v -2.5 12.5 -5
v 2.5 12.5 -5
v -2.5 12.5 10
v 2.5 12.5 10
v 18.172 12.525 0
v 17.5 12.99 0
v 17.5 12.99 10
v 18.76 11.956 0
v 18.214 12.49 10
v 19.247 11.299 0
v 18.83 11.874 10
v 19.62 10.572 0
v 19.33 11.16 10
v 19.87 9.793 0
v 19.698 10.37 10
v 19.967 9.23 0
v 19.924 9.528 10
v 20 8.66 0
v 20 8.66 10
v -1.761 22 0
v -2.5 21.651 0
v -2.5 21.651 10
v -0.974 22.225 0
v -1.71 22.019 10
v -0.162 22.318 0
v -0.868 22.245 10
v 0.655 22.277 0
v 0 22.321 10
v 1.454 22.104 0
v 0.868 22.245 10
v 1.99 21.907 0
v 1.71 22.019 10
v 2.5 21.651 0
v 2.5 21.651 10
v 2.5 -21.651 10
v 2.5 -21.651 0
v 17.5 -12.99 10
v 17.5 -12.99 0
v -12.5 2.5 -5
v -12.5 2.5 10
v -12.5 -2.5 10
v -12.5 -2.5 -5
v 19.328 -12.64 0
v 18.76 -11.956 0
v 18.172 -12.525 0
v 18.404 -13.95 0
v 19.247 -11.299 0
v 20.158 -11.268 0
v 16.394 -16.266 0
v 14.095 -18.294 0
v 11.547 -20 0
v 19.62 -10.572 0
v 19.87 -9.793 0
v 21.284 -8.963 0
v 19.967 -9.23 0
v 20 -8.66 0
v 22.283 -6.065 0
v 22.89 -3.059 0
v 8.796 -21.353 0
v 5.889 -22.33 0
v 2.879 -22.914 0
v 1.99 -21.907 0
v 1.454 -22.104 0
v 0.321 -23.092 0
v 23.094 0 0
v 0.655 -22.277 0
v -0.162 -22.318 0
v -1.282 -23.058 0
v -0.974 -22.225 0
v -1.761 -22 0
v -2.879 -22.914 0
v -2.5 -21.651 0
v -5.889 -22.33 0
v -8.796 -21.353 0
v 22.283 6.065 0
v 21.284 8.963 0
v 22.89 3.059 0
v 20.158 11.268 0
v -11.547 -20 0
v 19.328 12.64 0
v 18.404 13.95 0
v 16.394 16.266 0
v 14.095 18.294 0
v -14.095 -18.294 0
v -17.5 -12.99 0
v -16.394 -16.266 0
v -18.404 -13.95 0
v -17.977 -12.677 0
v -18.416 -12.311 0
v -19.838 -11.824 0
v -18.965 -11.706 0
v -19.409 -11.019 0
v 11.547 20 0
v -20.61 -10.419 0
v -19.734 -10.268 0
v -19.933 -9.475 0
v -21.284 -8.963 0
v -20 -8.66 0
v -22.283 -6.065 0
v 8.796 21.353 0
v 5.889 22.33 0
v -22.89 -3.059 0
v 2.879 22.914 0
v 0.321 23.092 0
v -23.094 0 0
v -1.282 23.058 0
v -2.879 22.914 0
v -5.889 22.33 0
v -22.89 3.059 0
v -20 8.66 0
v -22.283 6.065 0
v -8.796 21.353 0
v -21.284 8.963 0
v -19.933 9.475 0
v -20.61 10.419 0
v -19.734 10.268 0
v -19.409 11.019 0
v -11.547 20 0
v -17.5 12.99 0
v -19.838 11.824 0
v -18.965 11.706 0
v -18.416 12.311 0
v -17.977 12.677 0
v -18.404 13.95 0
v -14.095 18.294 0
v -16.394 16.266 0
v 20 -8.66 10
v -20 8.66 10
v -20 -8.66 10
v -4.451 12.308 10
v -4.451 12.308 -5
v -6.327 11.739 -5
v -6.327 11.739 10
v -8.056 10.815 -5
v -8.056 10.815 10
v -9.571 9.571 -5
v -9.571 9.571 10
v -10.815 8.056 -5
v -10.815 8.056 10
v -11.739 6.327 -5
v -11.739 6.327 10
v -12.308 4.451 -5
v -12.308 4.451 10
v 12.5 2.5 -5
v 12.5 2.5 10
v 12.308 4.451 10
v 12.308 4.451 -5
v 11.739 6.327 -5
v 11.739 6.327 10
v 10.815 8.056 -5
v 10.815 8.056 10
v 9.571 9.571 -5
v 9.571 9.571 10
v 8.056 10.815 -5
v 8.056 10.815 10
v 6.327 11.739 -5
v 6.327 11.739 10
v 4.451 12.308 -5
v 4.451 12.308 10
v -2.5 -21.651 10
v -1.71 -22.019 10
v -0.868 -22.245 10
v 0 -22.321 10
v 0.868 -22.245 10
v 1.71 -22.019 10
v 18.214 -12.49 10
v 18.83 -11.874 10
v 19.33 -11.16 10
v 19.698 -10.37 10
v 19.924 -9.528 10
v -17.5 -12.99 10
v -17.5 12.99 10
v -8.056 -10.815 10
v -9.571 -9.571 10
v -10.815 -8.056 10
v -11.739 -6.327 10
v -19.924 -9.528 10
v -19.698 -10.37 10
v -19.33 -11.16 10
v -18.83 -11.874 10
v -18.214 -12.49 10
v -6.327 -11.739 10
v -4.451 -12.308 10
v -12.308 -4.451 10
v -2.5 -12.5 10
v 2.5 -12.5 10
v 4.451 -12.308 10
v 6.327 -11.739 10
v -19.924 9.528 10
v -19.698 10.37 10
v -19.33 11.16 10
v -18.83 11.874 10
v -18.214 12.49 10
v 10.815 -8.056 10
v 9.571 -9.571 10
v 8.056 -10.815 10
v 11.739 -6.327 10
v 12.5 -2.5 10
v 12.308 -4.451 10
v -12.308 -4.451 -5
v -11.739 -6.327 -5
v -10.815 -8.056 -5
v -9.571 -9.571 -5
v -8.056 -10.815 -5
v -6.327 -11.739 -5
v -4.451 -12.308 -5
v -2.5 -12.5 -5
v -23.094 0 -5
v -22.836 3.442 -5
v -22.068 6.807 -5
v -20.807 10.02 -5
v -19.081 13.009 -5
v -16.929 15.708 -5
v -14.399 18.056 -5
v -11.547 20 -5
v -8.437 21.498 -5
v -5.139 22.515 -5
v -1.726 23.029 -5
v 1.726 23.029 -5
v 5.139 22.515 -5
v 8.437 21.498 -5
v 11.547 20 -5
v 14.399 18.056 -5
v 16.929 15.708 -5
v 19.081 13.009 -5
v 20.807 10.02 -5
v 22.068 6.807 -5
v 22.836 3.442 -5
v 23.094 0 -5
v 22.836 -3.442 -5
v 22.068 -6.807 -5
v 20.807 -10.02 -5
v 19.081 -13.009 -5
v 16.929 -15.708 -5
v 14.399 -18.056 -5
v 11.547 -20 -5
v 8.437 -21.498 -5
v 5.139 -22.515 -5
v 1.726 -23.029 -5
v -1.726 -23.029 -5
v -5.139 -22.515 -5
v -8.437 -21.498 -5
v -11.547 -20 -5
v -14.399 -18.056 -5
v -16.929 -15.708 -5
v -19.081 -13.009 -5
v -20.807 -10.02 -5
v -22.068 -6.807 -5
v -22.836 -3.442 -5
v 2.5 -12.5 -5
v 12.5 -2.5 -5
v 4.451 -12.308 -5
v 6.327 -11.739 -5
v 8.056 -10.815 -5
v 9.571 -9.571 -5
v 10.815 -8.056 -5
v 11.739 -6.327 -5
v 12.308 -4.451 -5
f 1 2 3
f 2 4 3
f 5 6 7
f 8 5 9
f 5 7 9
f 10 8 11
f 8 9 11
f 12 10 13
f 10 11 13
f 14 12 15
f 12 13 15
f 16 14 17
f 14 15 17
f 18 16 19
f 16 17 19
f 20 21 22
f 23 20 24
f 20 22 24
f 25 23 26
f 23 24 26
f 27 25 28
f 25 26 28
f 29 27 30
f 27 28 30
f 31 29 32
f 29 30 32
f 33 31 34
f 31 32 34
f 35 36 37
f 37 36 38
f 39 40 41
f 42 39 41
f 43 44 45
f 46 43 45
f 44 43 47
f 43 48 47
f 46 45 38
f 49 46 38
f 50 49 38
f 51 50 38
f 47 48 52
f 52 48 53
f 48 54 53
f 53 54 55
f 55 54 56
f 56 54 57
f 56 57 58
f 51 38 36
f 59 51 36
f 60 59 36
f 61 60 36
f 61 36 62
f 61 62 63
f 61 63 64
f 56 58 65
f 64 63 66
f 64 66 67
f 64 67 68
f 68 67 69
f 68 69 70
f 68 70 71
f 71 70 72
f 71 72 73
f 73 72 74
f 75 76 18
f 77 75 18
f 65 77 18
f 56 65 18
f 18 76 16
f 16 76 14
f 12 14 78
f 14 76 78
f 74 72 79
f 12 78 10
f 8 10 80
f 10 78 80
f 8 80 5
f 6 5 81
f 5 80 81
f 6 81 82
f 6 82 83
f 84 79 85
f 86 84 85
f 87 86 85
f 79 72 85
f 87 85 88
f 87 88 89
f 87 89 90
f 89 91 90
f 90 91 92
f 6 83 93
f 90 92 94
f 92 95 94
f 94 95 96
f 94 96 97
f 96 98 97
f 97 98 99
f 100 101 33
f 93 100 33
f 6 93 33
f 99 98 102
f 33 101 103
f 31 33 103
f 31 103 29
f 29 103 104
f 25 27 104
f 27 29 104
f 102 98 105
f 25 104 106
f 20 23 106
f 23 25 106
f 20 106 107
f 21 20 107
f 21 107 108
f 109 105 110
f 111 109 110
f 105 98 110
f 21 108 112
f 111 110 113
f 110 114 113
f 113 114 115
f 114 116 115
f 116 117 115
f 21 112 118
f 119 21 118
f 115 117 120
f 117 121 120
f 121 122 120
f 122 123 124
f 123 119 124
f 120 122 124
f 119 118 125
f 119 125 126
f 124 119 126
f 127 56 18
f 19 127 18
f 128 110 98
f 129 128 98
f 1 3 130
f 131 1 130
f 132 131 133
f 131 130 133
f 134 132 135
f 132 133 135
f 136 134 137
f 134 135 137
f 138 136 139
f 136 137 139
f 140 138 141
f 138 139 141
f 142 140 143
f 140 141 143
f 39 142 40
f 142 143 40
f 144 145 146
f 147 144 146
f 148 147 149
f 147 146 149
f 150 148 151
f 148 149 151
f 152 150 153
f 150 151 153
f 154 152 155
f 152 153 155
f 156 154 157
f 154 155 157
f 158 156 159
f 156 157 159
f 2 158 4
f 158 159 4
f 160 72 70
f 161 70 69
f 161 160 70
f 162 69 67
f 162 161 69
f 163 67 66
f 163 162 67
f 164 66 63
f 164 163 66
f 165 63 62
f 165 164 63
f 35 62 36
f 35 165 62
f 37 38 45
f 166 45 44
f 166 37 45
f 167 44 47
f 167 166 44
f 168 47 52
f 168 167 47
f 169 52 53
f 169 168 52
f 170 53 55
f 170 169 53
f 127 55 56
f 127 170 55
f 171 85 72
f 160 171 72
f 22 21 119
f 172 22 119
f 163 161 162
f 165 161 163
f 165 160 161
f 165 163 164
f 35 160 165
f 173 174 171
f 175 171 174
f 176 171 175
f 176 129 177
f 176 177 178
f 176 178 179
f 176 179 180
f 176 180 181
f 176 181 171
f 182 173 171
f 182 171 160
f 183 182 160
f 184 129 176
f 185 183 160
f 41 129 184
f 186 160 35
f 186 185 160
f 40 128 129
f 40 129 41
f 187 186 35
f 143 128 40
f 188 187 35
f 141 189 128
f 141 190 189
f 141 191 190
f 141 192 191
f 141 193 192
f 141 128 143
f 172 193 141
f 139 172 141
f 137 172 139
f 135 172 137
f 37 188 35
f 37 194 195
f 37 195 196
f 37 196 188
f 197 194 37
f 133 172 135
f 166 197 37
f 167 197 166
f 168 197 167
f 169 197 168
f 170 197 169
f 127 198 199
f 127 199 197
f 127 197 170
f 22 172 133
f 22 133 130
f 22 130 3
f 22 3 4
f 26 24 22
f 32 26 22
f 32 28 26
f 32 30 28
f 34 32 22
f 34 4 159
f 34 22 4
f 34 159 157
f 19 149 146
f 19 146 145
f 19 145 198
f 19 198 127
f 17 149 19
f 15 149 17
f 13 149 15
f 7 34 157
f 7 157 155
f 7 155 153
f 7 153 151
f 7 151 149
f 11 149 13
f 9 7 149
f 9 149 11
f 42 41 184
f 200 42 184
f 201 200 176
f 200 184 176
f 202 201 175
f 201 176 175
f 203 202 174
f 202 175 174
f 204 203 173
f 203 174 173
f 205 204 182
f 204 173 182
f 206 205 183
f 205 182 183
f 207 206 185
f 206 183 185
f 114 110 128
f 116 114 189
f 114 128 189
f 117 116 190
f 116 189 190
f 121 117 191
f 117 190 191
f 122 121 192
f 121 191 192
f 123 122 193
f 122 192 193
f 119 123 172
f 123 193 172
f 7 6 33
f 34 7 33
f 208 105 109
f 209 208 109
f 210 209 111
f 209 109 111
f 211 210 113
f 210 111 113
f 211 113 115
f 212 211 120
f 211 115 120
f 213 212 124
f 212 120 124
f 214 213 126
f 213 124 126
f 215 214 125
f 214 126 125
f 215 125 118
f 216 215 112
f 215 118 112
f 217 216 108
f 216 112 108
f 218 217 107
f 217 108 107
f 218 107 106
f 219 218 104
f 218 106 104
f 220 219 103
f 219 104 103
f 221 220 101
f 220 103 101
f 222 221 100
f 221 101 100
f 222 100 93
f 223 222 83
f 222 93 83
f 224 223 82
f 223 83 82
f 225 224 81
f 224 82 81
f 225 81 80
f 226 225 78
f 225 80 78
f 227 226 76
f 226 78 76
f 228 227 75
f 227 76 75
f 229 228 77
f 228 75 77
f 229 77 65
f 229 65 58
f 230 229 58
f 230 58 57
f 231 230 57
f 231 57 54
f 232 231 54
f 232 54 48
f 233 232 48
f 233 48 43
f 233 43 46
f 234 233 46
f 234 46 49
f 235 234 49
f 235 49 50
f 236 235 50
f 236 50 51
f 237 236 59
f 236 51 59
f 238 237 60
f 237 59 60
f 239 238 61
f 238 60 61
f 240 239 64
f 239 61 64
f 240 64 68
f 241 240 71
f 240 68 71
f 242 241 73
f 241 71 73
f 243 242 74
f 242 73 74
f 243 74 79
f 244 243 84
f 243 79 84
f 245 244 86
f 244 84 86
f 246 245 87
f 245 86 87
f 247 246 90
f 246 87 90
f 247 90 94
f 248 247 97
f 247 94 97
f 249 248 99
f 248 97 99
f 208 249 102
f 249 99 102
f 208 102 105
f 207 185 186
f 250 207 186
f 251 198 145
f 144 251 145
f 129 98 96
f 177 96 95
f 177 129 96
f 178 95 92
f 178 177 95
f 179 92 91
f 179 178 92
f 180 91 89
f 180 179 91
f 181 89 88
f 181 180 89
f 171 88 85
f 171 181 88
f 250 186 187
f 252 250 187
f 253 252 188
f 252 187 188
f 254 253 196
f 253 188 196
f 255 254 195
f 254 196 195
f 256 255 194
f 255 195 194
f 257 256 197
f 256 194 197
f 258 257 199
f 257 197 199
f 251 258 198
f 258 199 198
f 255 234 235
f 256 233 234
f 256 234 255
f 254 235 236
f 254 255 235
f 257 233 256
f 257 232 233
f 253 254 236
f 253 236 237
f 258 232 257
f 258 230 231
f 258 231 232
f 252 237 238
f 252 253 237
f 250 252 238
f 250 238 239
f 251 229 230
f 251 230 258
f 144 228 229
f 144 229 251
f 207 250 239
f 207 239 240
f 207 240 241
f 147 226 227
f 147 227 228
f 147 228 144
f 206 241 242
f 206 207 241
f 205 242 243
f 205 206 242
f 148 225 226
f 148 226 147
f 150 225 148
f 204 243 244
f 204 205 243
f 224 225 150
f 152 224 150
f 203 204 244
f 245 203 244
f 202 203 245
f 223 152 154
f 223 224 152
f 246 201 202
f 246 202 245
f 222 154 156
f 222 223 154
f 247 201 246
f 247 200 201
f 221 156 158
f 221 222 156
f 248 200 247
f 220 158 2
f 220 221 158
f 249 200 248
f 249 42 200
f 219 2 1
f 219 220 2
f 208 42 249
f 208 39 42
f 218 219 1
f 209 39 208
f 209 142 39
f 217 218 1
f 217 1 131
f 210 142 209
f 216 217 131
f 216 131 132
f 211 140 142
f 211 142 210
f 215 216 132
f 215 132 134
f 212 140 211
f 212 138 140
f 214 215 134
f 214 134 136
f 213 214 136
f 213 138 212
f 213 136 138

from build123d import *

# Parameters (mm, degrees)
BOSS_EXTRUDE1_DEPTH = 10
SKETCH2_R           = 23.094010768
BOSS_EXTRUDE2_DEPTH = 5
FILLET1_R           = 5


with BuildPart() as part:
    # Sketch1 → Boss-Extrude1 (new body)
    with BuildSketch(Plane.XY):
        Polygon((20, -11.547005384), (20, 11.547005384), (0, 23.094010768), (-20, 11.547005384), (-20, -11.547005384), (0, -23.094010768), align=None)
        with BuildLine():
            Line((2.5, -12.5), (-2.5, -12.5))
            ThreePointArc((-2.5, -12.5), (-9.571067812, -9.571067812), (-12.5, -2.5))
            Line((-12.5, -2.5), (-12.5, 2.5))
            ThreePointArc((-12.5, 2.5), (-9.571067812, 9.571067812), (-2.5, 12.5))
            Line((-2.5, 12.5), (2.5, 12.5))
            ThreePointArc((2.5, 12.5), (9.571067812, 9.571067812), (12.5, 2.5))
            Line((12.5, 2.5), (12.5, -2.5))
            ThreePointArc((12.5, -2.5), (9.571067812, -9.571067812), (2.5, -12.5))
        make_face(mode=Mode.SUBTRACT)
    extrude(amount=BOSS_EXTRUDE1_DEPTH)

    # Sketch2 → Boss-Extrude2 (add)
    with BuildSketch(Plane(origin=(0, 0, 0), x_dir=(-1, 0, 0), z_dir=(0, 0, -1))):
        Circle(SKETCH2_R)
        with BuildLine():
            Line((-2.5, 12.5), (2.5, 12.5))
            ThreePointArc((2.5, 12.5), (9.571067812, 9.571067812), (12.5, 2.5))
            Line((12.5, 2.5), (12.5, -2.5))
            ThreePointArc((12.5, -2.5), (9.571067812, -9.571067812), (2.5, -12.5))
            Line((2.5, -12.5), (-2.5, -12.5))
            ThreePointArc((-2.5, -12.5), (-9.571067812, -9.571067812), (-12.5, -2.5))
            Line((-12.5, -2.5), (-12.5, 2.5))
            ThreePointArc((-12.5, 2.5), (-9.571067812, 9.571067812), (-2.5, 12.5))
        make_face(mode=Mode.SUBTRACT)
    extrude(amount=BOSS_EXTRUDE2_DEPTH)

    # Fillet1
    fillet1_edges = [part.edges().sort_by_distance(p)[0] for p in [
        (20, -11.547005384, 5),
        (0, -23.094010768, 5),
        (-20, -11.547005384, 5),
        (-20, 11.547005384, 5),
        (0, 23.094010768, 5),
        (20, 11.547005384, 5),
    ]]
    fillet(fillet1_edges, radius=FILLET1_R)


solid = part.part
